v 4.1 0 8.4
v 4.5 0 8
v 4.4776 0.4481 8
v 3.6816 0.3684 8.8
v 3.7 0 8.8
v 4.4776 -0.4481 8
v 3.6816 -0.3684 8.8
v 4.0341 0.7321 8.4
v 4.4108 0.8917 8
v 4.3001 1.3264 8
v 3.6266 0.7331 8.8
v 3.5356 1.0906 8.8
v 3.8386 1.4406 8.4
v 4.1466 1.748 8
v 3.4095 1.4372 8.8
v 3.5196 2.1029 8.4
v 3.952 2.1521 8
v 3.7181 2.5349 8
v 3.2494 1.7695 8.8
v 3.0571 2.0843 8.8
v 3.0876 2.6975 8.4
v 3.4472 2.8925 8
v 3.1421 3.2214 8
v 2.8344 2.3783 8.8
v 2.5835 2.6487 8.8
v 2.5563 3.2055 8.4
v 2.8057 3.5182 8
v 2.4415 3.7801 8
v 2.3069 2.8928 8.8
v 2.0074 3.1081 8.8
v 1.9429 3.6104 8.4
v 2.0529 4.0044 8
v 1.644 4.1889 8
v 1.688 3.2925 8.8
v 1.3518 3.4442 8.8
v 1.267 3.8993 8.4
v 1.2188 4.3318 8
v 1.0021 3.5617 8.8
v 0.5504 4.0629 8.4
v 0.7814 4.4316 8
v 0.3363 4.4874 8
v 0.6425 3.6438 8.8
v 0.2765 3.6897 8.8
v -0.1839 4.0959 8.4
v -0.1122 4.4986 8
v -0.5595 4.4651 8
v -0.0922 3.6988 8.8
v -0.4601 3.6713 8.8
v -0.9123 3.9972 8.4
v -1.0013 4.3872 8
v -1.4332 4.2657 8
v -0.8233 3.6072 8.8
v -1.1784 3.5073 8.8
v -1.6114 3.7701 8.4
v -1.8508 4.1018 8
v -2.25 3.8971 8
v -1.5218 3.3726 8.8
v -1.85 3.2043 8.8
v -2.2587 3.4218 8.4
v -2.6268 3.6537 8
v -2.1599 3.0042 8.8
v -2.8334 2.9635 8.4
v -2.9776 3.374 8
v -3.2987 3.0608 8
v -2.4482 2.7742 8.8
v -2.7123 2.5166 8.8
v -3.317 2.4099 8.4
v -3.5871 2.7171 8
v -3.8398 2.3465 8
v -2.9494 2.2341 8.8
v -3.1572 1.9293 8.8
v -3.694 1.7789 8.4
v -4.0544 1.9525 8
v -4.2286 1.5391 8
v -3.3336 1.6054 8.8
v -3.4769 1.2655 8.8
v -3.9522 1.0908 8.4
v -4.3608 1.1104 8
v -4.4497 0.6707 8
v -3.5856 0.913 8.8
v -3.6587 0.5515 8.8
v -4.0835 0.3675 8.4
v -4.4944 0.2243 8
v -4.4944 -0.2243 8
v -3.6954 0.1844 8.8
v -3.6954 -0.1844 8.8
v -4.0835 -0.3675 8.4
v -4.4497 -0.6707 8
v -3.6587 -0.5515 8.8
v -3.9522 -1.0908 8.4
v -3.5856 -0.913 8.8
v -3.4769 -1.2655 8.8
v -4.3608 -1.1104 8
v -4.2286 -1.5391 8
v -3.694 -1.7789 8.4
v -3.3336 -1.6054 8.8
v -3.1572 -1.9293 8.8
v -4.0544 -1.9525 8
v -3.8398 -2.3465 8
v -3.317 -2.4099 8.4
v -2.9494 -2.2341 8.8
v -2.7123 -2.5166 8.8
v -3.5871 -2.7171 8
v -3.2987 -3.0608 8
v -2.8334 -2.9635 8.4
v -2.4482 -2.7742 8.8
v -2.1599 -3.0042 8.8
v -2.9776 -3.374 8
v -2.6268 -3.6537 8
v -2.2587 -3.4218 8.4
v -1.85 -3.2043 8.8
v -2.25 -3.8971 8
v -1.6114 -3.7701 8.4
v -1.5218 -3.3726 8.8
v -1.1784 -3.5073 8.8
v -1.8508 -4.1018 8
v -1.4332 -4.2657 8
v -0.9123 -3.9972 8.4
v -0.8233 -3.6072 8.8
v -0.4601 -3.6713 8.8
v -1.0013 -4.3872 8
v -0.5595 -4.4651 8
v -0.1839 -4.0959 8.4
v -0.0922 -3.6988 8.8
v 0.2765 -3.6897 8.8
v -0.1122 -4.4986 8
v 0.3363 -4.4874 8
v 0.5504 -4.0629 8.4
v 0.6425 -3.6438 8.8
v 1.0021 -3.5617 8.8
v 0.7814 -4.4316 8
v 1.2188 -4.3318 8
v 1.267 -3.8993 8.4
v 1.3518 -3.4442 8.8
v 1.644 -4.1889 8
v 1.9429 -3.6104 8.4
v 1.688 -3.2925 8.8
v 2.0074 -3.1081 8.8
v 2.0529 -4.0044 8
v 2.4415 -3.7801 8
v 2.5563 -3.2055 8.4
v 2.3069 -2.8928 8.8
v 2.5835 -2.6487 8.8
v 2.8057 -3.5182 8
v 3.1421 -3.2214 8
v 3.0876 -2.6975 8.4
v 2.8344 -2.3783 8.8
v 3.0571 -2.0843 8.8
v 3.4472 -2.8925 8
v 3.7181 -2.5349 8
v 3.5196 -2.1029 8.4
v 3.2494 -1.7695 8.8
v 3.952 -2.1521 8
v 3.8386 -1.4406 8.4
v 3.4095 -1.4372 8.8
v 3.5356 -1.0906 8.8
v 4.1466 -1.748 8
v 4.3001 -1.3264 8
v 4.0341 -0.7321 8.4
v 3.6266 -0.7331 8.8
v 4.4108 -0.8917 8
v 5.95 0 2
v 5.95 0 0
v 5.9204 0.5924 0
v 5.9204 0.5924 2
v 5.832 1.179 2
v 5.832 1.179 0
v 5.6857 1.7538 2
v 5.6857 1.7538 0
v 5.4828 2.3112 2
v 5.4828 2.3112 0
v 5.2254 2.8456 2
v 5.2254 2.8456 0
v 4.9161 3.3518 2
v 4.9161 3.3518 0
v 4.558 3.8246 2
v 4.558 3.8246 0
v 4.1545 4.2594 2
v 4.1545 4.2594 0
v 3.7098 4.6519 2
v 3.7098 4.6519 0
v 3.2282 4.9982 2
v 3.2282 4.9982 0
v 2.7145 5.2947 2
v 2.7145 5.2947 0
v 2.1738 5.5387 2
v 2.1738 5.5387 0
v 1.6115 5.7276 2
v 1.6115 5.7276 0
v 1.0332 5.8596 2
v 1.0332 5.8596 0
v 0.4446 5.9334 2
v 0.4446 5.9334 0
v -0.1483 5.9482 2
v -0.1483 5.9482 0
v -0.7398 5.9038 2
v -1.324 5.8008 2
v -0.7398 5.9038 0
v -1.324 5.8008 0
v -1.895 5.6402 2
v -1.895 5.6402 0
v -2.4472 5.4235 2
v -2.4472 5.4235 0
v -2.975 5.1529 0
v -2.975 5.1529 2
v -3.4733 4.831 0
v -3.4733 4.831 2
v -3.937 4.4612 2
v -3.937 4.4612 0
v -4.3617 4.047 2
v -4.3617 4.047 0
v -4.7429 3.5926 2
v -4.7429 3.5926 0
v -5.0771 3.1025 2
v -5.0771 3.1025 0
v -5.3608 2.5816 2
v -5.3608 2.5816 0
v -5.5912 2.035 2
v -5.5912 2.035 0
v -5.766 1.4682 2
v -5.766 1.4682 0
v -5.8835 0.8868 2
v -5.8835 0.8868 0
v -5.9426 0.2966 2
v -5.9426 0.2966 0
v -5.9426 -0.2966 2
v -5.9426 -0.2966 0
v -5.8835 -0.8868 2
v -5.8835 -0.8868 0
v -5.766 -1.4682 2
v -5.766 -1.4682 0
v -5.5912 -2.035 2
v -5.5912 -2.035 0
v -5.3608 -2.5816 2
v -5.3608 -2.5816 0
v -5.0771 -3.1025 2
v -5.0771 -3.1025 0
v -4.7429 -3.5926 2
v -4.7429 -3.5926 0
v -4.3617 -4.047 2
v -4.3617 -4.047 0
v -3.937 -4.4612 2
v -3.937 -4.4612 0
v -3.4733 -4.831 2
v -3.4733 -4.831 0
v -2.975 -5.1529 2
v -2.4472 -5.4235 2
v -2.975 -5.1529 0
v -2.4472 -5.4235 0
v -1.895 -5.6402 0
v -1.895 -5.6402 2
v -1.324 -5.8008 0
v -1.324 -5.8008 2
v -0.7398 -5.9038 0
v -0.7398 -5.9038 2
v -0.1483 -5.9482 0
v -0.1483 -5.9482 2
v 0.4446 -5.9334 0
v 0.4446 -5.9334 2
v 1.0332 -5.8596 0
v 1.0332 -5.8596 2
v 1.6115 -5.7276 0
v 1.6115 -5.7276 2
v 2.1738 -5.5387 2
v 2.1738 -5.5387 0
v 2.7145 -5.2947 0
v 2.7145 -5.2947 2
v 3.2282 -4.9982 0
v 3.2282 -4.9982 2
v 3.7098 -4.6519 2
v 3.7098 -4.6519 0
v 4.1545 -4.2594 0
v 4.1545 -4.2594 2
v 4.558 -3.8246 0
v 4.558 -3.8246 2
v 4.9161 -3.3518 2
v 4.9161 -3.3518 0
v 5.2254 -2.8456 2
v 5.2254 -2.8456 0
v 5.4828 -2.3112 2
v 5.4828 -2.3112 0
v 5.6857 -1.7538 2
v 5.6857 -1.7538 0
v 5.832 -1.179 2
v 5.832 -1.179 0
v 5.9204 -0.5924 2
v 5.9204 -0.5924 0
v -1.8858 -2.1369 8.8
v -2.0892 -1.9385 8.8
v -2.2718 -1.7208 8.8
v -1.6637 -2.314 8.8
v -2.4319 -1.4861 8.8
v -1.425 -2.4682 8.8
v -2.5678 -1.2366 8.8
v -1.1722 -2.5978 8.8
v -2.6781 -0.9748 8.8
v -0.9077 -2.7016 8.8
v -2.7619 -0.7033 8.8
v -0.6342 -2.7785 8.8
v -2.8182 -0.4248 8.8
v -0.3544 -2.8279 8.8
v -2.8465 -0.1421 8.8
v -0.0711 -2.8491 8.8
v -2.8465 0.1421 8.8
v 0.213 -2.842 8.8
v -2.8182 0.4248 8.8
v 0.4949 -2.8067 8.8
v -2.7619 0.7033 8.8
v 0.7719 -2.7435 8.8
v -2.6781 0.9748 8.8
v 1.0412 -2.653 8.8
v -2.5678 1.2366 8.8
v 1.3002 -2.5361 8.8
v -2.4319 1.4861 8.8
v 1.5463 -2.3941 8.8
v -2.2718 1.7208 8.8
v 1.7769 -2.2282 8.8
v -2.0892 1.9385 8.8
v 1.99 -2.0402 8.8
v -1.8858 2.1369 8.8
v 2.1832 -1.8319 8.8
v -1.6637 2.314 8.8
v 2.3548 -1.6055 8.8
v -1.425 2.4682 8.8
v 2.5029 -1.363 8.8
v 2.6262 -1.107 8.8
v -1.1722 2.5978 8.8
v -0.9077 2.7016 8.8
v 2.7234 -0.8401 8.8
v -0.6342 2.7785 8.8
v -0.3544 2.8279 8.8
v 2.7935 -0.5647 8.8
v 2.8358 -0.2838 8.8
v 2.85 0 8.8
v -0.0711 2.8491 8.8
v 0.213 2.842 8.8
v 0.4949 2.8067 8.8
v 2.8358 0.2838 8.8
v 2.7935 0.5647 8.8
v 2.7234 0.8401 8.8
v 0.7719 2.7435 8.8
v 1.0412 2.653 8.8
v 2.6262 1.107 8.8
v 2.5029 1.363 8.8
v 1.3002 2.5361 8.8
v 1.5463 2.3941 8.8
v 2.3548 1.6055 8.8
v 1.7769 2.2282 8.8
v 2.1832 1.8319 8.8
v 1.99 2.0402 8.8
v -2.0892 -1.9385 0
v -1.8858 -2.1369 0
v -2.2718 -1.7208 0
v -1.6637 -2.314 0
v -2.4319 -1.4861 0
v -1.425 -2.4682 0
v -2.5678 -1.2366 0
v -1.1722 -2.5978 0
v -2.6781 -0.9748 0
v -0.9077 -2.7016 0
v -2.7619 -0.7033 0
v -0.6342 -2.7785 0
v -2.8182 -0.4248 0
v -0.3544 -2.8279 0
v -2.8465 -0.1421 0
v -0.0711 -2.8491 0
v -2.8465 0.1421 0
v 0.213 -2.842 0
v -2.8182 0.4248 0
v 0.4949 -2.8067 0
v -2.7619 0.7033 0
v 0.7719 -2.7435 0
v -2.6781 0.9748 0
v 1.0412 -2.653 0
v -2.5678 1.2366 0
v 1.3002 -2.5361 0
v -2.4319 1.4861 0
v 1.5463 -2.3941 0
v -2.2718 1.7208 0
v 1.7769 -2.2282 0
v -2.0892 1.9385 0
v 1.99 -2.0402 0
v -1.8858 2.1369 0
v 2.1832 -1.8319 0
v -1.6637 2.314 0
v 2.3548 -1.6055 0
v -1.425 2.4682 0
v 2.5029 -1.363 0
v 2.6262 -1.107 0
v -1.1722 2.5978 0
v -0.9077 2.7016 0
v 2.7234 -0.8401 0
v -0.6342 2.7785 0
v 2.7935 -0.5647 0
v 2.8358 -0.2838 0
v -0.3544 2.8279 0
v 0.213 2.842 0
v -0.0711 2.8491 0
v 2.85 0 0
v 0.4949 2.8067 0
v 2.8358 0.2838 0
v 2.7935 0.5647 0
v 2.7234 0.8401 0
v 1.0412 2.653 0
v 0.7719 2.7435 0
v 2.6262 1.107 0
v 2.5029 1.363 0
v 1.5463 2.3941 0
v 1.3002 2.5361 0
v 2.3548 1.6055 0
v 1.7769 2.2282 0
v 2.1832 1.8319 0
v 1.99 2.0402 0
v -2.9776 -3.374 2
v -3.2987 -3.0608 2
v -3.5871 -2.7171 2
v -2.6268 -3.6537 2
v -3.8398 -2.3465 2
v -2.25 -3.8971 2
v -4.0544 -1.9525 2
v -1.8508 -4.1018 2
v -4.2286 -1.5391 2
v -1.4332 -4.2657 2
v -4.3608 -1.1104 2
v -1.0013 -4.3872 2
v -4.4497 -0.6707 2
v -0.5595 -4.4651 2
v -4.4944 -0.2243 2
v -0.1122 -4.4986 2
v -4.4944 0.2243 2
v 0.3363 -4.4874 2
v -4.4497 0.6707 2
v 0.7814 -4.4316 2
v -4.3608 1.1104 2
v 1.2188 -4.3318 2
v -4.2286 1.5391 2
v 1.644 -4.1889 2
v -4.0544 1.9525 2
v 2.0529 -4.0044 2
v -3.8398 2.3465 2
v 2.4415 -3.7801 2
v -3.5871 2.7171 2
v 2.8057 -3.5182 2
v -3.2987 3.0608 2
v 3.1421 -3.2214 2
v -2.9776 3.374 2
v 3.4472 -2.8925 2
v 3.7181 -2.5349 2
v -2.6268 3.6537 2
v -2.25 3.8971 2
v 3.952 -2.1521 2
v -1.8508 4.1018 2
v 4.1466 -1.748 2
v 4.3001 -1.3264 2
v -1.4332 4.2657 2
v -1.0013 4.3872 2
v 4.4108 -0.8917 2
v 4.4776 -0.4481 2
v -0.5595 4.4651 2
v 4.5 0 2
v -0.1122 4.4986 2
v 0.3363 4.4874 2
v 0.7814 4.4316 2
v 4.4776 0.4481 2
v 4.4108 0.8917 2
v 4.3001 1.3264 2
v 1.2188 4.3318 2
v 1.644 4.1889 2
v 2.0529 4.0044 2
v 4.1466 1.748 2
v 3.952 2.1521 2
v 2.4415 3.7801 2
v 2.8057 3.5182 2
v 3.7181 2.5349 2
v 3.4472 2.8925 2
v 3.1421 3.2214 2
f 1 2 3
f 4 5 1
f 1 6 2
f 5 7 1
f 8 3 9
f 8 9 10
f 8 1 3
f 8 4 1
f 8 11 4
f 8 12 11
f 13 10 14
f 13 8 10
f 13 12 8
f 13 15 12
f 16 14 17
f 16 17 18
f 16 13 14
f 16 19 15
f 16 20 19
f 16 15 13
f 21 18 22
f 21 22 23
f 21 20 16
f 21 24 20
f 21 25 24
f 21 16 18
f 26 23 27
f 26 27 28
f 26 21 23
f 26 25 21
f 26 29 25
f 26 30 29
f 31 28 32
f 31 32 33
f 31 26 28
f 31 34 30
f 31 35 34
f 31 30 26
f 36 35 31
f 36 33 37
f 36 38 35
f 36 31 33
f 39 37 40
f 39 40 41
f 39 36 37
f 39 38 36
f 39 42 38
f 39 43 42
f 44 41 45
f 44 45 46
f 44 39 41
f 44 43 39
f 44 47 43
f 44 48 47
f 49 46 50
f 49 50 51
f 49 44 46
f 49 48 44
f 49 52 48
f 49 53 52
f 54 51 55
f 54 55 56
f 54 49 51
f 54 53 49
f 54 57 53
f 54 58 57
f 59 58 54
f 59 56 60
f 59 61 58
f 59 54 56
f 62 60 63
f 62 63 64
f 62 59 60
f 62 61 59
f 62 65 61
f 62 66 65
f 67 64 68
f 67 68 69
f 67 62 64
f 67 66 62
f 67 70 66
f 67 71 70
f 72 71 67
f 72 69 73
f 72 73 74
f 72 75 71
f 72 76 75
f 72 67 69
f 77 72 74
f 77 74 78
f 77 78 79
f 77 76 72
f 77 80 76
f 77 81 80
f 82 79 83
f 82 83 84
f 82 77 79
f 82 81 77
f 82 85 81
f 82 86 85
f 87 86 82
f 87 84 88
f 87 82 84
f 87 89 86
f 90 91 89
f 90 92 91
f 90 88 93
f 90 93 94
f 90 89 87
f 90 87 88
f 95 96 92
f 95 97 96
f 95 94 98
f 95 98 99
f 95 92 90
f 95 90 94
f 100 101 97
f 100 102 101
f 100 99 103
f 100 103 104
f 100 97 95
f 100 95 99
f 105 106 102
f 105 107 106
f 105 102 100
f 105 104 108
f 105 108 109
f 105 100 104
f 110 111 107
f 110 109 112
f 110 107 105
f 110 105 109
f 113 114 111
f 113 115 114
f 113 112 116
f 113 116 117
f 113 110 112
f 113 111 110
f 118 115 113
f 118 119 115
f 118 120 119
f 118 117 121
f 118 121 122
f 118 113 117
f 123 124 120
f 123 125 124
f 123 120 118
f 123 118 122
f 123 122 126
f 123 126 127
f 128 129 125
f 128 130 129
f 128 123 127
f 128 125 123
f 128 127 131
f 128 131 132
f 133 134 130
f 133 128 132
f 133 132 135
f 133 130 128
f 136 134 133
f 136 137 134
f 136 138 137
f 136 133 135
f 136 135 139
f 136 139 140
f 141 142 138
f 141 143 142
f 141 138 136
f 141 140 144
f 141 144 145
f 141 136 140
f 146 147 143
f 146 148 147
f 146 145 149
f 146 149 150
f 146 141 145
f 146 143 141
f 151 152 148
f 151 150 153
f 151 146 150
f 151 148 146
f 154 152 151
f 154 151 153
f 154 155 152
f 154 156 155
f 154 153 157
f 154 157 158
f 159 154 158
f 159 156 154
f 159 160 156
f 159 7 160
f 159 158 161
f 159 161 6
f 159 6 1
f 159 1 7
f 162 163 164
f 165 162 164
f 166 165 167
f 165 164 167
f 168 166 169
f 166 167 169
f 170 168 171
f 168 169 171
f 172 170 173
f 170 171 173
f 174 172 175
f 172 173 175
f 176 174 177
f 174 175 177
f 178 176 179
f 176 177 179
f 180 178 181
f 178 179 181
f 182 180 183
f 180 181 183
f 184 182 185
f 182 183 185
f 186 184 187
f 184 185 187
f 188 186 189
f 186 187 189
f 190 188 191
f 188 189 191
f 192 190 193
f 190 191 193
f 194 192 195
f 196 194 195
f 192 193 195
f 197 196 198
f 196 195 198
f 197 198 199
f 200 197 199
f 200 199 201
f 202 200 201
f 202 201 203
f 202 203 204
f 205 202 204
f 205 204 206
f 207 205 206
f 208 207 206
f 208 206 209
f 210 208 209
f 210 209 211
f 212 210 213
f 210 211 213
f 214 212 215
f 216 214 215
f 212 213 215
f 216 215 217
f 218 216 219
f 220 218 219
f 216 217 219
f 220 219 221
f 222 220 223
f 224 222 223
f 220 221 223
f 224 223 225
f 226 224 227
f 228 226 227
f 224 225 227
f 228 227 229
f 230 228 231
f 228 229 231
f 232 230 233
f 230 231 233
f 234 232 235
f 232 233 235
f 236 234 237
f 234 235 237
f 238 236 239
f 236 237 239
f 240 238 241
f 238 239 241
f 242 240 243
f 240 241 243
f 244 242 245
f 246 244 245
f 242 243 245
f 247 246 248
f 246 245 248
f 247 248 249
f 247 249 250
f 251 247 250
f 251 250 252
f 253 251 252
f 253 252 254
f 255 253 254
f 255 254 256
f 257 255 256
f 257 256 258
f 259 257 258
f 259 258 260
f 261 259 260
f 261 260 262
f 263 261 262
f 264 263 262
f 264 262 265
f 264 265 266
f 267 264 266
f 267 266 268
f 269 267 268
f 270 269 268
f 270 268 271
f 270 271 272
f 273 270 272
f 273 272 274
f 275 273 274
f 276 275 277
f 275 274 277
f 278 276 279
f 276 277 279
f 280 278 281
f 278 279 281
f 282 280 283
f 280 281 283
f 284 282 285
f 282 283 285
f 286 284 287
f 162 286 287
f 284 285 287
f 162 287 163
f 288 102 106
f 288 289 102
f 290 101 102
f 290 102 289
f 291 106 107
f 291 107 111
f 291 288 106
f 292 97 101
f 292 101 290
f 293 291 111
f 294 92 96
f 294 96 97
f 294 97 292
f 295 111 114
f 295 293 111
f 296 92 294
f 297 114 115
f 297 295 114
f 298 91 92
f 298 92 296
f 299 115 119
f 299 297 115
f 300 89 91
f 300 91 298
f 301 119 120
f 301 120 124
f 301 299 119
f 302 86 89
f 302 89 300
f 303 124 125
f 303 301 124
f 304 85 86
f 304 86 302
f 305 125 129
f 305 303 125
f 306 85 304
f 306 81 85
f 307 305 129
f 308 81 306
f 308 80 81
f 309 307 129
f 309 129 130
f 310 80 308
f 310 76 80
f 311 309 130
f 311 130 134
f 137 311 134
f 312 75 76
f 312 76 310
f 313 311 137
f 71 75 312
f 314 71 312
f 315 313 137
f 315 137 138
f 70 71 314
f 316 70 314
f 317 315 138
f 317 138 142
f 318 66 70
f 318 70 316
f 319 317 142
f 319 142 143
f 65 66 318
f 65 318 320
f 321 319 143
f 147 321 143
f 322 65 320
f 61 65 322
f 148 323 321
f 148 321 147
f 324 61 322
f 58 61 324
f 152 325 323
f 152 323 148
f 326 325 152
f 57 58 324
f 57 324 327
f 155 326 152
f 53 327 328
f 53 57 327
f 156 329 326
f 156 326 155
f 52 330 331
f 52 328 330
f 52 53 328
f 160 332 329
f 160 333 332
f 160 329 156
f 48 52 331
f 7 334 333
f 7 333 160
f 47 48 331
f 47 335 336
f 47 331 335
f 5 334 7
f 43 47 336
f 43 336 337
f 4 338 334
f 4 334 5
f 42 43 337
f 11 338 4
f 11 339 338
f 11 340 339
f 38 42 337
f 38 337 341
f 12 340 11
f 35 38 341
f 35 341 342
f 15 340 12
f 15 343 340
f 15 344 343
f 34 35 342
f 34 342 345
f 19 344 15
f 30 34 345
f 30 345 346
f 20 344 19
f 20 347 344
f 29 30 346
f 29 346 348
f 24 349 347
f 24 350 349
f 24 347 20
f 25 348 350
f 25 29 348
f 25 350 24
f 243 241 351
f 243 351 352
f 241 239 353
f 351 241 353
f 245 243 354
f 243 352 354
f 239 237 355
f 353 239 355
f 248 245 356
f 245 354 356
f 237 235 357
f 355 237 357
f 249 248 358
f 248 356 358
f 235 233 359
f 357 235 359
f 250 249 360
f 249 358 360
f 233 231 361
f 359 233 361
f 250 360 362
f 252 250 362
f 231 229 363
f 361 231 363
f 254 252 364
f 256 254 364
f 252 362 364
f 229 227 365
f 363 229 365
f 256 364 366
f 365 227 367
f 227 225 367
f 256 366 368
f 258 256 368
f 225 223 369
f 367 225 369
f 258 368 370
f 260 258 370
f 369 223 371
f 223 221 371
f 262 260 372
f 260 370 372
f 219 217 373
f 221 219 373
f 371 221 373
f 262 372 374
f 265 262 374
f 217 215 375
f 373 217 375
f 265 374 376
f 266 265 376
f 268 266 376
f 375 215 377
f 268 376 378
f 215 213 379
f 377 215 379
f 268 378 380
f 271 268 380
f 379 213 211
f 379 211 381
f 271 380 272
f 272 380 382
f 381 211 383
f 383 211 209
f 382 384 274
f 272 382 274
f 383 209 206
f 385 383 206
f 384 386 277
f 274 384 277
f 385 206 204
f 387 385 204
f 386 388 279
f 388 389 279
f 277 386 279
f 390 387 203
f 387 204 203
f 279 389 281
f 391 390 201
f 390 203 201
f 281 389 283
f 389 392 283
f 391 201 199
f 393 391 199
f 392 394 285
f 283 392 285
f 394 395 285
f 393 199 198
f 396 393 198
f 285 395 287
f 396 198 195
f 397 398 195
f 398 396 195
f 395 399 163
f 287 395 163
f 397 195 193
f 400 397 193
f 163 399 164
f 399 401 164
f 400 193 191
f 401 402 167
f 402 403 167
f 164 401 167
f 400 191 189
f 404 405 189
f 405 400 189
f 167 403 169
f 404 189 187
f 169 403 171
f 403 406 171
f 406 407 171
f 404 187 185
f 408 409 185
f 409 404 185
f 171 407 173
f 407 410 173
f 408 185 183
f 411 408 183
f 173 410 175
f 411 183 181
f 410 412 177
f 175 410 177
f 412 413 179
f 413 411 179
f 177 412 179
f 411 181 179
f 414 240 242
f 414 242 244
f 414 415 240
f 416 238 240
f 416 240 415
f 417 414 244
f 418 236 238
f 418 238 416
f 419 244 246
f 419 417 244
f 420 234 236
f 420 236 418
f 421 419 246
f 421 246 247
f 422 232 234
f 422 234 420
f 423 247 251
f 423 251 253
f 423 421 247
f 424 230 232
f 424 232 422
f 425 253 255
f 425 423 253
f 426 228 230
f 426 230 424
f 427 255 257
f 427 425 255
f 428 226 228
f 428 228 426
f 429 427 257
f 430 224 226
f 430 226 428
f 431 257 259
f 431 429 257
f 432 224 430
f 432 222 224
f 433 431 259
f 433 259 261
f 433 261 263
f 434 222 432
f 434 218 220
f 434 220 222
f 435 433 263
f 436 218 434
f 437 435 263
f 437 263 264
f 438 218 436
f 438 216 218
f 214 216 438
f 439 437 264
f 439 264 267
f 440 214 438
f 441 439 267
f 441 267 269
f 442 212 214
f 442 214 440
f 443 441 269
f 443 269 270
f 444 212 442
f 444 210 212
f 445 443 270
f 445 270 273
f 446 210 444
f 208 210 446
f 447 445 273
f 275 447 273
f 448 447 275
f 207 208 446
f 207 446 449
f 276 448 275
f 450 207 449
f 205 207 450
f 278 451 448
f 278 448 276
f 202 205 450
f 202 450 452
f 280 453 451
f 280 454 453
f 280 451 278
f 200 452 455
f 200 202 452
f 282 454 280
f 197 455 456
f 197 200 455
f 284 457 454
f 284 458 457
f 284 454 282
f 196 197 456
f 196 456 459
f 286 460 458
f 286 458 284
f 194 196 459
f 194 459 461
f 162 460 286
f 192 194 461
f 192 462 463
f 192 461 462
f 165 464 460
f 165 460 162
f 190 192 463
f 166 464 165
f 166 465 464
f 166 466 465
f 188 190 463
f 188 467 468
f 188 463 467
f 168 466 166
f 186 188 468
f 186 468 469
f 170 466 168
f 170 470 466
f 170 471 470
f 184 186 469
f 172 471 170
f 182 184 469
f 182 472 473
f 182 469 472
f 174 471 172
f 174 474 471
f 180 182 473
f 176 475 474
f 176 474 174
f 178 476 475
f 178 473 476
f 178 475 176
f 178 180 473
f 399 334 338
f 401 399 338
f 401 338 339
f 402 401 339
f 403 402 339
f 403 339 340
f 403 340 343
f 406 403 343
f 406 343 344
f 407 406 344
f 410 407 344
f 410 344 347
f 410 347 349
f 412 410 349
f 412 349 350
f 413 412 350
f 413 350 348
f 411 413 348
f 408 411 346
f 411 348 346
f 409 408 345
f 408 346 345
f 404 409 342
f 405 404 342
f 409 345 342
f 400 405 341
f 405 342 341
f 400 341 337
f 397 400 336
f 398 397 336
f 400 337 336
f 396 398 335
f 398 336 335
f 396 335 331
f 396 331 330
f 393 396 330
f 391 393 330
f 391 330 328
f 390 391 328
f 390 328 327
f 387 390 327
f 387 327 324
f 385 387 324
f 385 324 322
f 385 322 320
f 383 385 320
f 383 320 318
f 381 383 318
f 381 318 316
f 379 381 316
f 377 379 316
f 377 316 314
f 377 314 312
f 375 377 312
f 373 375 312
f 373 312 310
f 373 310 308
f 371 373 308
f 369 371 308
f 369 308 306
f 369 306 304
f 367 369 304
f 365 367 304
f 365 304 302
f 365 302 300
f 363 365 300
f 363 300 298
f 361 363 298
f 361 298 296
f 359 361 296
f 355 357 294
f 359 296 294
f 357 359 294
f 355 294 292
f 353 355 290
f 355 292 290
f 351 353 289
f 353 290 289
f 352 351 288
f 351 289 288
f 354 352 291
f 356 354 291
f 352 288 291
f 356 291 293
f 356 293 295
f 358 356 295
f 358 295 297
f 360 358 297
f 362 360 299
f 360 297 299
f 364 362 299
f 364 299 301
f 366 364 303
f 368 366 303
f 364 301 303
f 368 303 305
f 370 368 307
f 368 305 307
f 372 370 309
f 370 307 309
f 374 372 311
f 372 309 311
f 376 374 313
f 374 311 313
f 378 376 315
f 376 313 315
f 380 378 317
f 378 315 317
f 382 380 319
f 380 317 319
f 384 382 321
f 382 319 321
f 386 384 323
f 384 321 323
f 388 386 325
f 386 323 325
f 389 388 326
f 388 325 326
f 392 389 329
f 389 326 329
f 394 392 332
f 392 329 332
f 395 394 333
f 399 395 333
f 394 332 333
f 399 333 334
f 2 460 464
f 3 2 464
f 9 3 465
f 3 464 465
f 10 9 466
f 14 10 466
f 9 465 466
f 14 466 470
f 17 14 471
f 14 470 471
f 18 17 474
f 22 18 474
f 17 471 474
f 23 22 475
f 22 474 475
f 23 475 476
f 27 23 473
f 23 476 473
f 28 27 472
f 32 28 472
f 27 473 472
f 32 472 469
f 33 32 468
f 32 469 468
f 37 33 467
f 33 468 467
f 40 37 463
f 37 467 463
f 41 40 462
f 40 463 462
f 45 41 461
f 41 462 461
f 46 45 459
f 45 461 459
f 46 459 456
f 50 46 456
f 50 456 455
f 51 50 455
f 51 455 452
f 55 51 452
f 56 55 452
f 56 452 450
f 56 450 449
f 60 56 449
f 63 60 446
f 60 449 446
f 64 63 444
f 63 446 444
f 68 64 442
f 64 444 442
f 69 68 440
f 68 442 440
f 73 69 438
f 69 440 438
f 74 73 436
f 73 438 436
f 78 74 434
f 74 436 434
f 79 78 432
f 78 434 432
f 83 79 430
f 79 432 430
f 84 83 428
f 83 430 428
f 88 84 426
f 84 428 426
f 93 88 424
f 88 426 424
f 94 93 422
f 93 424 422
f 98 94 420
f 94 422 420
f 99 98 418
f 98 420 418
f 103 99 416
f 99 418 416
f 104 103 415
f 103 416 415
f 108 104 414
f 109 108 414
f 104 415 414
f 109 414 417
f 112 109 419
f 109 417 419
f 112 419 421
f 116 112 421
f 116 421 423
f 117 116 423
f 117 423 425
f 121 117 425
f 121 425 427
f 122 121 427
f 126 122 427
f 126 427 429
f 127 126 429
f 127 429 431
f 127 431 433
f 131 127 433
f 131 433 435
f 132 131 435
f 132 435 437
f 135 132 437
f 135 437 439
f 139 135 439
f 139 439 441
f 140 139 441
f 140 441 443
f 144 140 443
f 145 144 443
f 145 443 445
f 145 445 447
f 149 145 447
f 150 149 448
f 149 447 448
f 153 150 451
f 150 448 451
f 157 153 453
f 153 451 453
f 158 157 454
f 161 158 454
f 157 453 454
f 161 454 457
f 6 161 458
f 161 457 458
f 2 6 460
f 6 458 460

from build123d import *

# Parameters (mm, degrees)
F0_R     = 5.95
F1_DEPTH = 2
F2_R     = 4.5
F3_DEPTH = 6.8
F4_R     = 2.85
F5_DEPTH = 8.801
F6_SIZE  = 0.8


with BuildPart() as f1:
    # F0 (on Top) → F1 (new body)
    with BuildSketch(Plane.XY):
        Circle(F0_R)
    extrude(amount=F1_DEPTH)

    # F2 (on face) → F3 (join)
    with BuildSketch(Plane.XY.offset(2)):
        Circle(F2_R)
    extrude(amount=F3_DEPTH)

    # F4 (on face) → F5 (cut, through all)
    with BuildSketch(Plane.XY.offset(8.8)):
        Circle(F4_R)
    extrude(amount=-F5_DEPTH, mode=Mode.SUBTRACT)

    # F6
    f6_edges = [f1.edges().sort_by_distance(p)[0] for p in [
        (-4.5, 0, 8.8),
    ]]
    chamfer(f6_edges, length=F6_SIZE)


solid = f1.part
